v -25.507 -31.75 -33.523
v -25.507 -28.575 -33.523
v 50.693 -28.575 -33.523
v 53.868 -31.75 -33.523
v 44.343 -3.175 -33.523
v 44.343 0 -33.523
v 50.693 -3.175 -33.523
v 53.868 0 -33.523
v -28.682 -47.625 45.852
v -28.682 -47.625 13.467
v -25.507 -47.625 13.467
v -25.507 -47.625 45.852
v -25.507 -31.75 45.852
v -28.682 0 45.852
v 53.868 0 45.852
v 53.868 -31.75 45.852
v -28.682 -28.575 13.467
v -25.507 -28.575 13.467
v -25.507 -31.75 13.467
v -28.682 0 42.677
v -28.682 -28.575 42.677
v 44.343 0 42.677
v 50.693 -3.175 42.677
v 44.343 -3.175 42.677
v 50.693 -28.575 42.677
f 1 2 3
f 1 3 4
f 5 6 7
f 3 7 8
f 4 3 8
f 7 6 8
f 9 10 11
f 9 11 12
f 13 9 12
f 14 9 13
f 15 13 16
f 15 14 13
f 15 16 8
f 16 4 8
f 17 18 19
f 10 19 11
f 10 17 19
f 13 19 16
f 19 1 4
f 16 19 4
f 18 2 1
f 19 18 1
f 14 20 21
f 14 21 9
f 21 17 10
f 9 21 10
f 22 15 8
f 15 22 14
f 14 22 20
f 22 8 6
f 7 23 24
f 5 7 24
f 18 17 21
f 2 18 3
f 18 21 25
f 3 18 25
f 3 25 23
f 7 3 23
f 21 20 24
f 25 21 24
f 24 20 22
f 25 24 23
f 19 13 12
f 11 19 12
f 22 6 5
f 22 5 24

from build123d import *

# Parameters (mm, degrees)
F0_W      = 82.55
F0_H      = 76.2
F1_DEPTH  = 31.75
F2_W      = 79.375
F2_H      = 28.575
F3_DEPTH  = 101.6
F4_W      = 9.525
F4_H      = 76.2
F5_DEPTH  = 3.175
F7_DEPTH  = 3.175
F8_W      = 19.05
F8_H      = 79.375
F9_DEPTH  = 3.175
F10_W     = 19.05
F10_H     = 46.99
F11_DEPTH = 3.175


with BuildPart() as f1:
    # F0 (on Front) → F1 (new body)
    with BuildSketch(Plane.XZ):
        with Locations((12.593148, 4.577052)):
            Rectangle(F0_W, F0_H)
    extrude(amount=F1_DEPTH)

    # F2 (on face) → F3 (cut)
    with BuildSketch(Plane.XY.offset(42.677052)):
        with Locations((11.005648, -14.2875)):
            Rectangle(F2_W, F2_H)
    extrude(amount=-F3_DEPTH, mode=Mode.SUBTRACT)

    # F4 (on face) → F5 (join)
    with BuildSketch(Plane(origin=(0, 0, 0), x_dir=(-1, 0, 0), z_dir=(0, 1, 0))):
        with Locations((-49.105648, 4.577052)):
            Rectangle(F4_W, F4_H)
    extrude(amount=-F5_DEPTH)

    # F6 (on face) → F7 (join)
    with BuildSketch(Plane.XY.offset(42.677052)):
        Polygon((-28.681852, -31.75), (53.868148, -31.75), (53.868148, 0), (-28.681852, 0), (-28.681852, -28.575), align=None)
    extrude(amount=F7_DEPTH)

    # F8 (on face) → F9 (join)
    with BuildSketch(Plane(origin=(-28.681852, 0, 0), x_dir=(0, -1, 0), z_dir=(-1, 0, 0))):
        with Locations((38.1, 6.164552)):
            Rectangle(F8_W, F8_H)
    extrude(amount=-F9_DEPTH)

    # F10 (on face) → F11 (cut)
    with BuildSketch(Plane(origin=(-28.681852, 0, 0), x_dir=(0, -1, 0), z_dir=(-1, 0, 0))):
        with Locations((38.1, -10.027948)):
            Rectangle(F10_W, F10_H)
    extrude(amount=-F11_DEPTH, mode=Mode.SUBTRACT)


solid = f1.part
